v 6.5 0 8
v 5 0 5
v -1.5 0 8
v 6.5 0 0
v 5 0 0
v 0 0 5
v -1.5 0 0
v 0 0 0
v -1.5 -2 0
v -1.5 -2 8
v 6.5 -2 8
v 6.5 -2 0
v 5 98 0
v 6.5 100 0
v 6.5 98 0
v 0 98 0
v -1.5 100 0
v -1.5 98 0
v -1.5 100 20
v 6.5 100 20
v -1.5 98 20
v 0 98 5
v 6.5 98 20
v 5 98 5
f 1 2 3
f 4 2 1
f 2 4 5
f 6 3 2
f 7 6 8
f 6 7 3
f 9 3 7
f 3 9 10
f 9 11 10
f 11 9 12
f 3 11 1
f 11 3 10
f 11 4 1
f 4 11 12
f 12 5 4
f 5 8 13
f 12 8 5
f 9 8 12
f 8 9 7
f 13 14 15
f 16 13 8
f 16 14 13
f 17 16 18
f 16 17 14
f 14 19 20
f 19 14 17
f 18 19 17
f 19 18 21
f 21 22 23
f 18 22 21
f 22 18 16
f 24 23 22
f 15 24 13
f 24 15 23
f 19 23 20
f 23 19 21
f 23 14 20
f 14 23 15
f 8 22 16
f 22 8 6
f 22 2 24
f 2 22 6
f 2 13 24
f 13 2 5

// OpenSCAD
notch_depth = 5;
length=98;
thickness=2;
base=8;
stopper=20;

rotate([90,0,0]) {
    translate([0,0,-length]) linear_extrude(length) square(notch_depth);
    translate([-1.5,0,0]) {
        linear_extrude(thickness) square(base);
        translate([0,0,-(thickness+length)]) linear_extrude(thickness) square([base,stopper]);
    }
}
